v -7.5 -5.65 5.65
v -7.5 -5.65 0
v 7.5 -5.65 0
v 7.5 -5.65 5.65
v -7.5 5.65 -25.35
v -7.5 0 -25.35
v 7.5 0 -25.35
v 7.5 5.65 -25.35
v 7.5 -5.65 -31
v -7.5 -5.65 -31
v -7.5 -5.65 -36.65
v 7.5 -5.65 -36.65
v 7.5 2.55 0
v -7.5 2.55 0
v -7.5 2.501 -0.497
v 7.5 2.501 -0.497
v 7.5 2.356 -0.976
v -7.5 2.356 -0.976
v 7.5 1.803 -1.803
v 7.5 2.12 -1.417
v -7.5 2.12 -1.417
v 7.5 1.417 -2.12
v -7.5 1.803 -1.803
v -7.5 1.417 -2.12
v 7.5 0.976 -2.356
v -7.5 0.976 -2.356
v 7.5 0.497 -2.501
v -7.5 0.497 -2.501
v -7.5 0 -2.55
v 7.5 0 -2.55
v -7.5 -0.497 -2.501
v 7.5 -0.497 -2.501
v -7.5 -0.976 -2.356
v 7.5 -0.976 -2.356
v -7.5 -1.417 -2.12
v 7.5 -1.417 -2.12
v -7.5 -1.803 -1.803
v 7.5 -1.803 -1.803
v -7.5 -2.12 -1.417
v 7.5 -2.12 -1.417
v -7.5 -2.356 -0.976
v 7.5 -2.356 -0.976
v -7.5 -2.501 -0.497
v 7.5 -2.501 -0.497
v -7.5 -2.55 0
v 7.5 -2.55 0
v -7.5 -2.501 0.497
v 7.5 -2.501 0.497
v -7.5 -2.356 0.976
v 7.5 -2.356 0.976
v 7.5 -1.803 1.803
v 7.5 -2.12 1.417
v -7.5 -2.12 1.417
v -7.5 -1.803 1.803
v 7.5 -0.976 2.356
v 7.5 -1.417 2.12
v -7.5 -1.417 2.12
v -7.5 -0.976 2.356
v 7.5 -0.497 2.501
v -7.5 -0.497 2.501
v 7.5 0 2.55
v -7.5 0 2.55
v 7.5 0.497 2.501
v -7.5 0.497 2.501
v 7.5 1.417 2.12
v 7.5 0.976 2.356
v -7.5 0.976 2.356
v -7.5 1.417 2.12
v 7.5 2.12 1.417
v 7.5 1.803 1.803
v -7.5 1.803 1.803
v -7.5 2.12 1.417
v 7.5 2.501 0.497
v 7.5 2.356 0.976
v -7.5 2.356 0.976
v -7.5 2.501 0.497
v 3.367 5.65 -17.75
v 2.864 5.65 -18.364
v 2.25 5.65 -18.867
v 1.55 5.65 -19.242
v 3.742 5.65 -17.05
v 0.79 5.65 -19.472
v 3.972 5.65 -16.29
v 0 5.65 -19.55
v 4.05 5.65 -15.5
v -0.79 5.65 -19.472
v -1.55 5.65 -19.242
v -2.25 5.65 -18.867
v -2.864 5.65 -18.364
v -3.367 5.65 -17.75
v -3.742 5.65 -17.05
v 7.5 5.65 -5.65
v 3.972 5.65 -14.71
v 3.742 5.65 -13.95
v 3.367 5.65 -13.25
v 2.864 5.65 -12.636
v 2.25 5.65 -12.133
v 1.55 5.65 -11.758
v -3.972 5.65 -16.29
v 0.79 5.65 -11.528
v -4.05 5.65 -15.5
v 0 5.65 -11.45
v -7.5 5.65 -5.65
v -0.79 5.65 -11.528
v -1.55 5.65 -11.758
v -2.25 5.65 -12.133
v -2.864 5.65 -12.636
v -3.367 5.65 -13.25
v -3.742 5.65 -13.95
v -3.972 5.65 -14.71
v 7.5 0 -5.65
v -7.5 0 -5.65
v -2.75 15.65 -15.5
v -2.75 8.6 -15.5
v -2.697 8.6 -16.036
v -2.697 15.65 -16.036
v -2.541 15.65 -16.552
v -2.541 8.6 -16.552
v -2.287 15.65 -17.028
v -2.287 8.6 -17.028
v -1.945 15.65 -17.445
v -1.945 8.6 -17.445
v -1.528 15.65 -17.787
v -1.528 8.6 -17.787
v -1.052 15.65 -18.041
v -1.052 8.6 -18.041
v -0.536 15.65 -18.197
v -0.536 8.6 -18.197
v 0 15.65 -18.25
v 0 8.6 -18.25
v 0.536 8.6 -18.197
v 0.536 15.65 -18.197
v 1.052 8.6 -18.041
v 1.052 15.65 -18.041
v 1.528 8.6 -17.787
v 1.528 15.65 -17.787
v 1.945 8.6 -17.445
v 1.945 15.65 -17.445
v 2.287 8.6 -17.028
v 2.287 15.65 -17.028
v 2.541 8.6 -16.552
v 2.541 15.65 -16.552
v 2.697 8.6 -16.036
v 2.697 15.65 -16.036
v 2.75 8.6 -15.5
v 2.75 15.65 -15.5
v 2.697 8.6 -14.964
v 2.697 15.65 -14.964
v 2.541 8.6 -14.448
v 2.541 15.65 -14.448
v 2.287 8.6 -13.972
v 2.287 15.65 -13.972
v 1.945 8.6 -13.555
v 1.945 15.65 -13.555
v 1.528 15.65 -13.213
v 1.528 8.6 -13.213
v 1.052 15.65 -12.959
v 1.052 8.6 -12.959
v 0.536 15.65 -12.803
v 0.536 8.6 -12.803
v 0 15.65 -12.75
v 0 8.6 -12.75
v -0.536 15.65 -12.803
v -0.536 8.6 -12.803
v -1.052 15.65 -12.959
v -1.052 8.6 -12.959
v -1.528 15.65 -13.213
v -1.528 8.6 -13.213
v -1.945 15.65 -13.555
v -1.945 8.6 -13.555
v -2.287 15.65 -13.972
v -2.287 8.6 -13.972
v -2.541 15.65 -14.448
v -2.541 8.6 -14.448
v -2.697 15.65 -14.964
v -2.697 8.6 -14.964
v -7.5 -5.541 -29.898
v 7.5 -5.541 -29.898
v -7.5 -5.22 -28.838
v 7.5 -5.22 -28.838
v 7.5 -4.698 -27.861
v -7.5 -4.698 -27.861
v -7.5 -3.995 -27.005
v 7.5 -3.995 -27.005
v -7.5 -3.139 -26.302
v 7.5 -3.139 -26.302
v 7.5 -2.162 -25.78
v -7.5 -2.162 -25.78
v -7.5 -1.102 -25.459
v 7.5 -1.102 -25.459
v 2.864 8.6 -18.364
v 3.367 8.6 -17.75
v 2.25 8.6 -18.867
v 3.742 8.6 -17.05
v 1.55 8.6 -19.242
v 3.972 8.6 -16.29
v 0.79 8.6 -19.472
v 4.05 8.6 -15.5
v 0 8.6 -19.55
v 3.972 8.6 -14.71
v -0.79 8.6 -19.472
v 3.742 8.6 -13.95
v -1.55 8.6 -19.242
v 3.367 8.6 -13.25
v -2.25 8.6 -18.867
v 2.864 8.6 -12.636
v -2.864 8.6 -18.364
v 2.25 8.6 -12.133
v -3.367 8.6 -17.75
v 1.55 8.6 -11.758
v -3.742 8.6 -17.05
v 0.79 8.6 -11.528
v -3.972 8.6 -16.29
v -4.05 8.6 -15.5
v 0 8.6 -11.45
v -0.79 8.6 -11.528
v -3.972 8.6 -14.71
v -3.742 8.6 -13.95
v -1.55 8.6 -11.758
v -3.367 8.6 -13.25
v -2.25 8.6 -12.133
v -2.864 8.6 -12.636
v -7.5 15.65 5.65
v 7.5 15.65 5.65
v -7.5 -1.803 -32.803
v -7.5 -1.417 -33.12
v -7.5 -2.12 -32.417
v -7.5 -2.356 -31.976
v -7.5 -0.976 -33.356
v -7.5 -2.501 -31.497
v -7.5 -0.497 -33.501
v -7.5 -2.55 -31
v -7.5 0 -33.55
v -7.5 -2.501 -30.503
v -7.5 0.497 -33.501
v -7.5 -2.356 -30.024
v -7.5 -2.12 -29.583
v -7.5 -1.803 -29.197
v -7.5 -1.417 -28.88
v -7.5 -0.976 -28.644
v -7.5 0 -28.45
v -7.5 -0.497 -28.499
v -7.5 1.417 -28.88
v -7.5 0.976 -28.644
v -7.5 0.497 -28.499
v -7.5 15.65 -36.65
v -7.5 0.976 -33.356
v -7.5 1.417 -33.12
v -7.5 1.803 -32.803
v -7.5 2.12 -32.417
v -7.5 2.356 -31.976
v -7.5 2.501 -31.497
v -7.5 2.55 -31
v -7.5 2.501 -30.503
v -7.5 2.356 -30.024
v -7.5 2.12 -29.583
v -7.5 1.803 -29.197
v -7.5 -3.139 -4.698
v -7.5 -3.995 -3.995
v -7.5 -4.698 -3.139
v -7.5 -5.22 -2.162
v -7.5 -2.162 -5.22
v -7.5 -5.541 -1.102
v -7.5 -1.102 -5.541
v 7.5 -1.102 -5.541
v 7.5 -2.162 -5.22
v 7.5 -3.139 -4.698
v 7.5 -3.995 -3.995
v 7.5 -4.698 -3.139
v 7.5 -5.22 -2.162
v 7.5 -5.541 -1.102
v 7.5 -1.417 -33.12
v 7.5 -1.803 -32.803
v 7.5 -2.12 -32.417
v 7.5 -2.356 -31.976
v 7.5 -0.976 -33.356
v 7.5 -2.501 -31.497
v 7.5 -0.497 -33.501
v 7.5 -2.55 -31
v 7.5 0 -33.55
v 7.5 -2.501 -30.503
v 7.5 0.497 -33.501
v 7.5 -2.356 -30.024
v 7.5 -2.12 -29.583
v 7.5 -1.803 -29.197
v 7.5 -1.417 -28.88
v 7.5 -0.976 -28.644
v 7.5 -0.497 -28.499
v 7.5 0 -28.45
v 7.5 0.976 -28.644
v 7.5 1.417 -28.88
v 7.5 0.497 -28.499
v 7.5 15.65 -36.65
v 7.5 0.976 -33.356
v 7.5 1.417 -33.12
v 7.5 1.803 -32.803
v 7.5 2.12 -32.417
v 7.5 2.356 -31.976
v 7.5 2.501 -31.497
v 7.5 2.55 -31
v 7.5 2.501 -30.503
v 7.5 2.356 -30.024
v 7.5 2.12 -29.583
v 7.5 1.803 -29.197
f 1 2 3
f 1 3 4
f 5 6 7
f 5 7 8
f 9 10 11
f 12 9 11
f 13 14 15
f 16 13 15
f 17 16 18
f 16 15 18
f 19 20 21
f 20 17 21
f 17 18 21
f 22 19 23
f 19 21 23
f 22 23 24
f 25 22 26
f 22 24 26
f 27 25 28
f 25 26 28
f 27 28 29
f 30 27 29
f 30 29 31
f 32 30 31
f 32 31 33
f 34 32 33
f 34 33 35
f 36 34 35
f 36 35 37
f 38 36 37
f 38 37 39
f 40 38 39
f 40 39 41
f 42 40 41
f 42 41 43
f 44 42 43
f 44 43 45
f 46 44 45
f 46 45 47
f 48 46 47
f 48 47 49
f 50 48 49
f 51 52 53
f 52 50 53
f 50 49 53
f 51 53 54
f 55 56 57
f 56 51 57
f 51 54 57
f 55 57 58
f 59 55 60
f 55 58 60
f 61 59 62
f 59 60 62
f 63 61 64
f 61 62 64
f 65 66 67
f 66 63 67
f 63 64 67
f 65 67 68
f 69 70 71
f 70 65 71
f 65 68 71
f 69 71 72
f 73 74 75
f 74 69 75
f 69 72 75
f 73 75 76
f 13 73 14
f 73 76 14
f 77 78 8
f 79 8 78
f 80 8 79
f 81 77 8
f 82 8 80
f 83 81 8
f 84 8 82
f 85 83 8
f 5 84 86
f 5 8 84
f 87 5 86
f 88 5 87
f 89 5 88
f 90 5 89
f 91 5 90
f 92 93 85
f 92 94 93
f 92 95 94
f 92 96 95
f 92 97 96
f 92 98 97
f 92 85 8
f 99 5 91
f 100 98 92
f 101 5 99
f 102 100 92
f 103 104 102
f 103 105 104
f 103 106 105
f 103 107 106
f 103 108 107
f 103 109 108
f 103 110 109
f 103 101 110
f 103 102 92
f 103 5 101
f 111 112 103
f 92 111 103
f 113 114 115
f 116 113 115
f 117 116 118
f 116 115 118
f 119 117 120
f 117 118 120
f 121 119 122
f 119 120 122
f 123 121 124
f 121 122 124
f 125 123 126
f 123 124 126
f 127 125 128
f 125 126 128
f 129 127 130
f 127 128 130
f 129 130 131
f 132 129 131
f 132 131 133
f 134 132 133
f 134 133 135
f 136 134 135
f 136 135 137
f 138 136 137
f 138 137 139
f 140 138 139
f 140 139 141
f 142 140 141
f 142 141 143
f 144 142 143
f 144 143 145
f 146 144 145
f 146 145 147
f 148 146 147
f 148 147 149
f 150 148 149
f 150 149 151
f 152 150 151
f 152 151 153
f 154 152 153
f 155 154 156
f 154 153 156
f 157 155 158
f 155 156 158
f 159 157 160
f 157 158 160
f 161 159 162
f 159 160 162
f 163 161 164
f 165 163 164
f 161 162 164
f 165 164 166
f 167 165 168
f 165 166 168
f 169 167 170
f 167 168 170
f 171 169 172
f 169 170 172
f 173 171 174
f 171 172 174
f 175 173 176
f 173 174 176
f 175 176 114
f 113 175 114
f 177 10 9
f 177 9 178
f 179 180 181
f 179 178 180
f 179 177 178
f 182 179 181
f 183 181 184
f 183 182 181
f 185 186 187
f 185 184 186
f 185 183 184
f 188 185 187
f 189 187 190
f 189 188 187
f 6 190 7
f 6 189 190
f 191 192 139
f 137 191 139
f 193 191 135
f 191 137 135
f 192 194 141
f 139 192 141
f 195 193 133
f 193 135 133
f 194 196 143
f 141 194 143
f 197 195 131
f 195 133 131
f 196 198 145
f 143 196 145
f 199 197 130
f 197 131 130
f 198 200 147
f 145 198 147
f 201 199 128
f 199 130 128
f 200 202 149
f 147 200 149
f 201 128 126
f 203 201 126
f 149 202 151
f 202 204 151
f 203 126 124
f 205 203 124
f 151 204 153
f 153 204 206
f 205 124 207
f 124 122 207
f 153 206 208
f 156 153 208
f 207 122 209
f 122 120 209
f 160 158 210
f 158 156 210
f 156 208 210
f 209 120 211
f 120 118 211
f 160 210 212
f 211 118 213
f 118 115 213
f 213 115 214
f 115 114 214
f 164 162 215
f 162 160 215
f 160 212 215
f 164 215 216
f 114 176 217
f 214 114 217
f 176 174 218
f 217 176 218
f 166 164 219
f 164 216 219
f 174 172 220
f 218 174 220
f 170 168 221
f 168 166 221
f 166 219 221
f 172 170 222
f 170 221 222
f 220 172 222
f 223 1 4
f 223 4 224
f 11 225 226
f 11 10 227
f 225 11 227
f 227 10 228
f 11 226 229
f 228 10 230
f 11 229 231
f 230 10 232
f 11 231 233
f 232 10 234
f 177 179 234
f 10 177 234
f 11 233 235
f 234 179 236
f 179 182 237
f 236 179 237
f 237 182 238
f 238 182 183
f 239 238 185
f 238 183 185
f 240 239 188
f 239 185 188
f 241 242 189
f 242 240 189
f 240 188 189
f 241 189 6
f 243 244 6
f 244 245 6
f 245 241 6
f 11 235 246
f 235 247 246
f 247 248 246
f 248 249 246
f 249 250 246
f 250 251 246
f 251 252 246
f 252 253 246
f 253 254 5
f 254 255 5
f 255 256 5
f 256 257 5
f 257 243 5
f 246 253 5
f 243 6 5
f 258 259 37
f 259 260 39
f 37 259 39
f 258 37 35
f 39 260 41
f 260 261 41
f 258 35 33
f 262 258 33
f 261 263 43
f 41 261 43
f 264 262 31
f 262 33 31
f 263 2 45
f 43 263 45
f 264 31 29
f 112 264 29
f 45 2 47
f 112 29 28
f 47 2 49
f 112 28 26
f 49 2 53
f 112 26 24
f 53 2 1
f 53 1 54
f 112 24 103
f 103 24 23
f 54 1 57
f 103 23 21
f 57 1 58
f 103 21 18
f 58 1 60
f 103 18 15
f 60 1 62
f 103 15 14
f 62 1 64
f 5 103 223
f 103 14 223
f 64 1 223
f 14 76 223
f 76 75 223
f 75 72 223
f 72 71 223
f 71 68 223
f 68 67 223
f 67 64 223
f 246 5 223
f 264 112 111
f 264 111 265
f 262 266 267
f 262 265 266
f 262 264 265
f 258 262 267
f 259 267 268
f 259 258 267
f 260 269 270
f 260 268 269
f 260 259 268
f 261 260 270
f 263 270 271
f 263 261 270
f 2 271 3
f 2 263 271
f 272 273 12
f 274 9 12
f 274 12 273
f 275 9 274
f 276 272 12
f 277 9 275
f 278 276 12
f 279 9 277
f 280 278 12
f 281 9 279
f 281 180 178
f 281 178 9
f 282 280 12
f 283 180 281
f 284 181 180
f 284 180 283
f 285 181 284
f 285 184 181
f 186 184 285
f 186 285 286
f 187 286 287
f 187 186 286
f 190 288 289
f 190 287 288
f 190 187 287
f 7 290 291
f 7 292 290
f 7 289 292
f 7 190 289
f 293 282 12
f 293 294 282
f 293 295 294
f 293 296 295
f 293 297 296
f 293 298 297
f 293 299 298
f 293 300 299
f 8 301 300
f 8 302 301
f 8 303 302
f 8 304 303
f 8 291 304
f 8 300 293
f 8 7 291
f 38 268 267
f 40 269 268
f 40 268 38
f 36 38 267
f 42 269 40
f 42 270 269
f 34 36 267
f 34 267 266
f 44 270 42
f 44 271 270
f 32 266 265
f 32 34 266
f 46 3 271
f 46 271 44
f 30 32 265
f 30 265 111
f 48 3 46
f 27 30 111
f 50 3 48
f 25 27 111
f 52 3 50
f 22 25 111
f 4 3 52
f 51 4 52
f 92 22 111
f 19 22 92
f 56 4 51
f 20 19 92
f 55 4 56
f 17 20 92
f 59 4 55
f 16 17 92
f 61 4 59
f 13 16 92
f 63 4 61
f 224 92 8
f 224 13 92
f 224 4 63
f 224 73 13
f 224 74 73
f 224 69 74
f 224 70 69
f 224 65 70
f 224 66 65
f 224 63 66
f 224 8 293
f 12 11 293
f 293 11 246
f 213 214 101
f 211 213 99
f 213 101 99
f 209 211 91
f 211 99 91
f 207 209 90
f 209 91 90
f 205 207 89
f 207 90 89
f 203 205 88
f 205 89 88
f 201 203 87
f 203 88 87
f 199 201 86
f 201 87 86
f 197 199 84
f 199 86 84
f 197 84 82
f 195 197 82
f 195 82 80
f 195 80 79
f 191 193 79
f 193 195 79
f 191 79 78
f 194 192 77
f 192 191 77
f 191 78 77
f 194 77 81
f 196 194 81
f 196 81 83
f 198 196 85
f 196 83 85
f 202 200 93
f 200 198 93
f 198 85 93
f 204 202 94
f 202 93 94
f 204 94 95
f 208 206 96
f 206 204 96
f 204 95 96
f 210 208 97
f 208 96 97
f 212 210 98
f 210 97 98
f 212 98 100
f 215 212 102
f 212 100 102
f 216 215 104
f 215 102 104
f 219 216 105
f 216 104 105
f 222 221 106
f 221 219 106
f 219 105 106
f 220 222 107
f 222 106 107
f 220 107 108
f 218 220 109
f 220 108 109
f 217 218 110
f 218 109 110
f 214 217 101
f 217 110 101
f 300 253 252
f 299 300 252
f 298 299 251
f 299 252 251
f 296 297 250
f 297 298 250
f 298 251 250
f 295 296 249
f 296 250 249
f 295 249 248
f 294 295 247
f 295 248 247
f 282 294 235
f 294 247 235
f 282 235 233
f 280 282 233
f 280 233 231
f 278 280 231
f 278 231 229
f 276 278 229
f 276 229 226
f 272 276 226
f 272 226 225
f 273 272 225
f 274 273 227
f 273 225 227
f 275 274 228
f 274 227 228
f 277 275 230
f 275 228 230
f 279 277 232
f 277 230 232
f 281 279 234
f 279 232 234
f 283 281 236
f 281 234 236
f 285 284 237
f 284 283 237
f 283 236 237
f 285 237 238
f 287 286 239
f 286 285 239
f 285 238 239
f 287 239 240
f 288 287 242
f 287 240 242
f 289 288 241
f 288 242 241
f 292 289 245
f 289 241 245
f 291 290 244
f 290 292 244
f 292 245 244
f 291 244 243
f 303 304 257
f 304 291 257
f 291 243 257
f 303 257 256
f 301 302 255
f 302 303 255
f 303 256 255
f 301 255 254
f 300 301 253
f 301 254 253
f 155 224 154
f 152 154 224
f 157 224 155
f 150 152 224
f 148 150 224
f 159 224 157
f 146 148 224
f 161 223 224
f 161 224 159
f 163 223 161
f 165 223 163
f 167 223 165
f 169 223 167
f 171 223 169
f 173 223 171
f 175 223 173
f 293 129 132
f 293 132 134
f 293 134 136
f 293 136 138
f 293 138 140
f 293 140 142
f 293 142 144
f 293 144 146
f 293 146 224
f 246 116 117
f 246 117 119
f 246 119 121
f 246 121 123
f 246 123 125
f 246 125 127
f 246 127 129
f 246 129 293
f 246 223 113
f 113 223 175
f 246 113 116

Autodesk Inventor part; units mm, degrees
ref_plane "YZ Plane" through (0, 0, 0) normal (1, 0, 0) x (0, 1, 0)
ref_plane "XY Plane" through (0, 0, 0) normal (0, 0, 1) x (1, 0, 0)
sketch "Sketch3" plane through (0, 0, 0) normal (1, 0, 0) x (0, 1, 0)
  circle A0 centre (0, 0) radius 5.65 construction
  line L0 (-5.65, 0) -> (-5.65, 5.65)
  line L1 (0, -5.65) -> (5.65, -5.65)
  arc A1 (-5.65, 0) -> (0, -5.65) centre (0, 0) ccw
  line L2 (-5.65, 5.65) -> (5.65, 5.65)
  line L3 (5.65, -15.5) -> (-5.65, -15.5) construction
  line L4 (5.65, 5.65) -> (15.65, 5.65)
  line L5 (15.65, 5.65) -> (15.65, -15.5)
  line L6 (5.65, -5.65) -> (5.65, -15.5)
  line L7 (15.65, -15.5) -> (5.65, -15.5) construction
  circle A2 centre (0, 0) radius 2.55
  line L8 (-5.65, -31) -> (-5.65, -36.65)
  arc A3 (0, -25.35) -> (-5.65, -31) centre (0, -31) ccw
  line L9 (0, -25.35) -> (5.65, -25.35)
  line L10 (-5.65, -36.65) -> (5.65, -36.65)
  line L11 (5.65, -36.65) -> (15.65, -36.65)
  line L12 (15.65, -36.65) -> (15.65, -15.5)
  line L13 (5.65, -25.35) -> (5.65, -15.5)
  circle A4 centre (0, -31) radius 2.55
  dimension "d19" = 11.3
  dimension "d20" = 5.65
  dimension "d23" = 10
  dimension "d24" = 10
  dimension "d25" = 11.3
  dimension "d26" = 5.1
  dimension "d36" = 21.15
ref_plane "Work Plane1" through (0, 5.5, 0) normal (0, 1, 0) x (-1, 0, 0)
extrude "Extrusion5" add sketch "Sketch3" along normal mid plane 15
sketch "Sketch5" plane through (0, 5.5, 0) normal (0, 1, 0) x (-1, 0, 0)
  line L0 (7.5, -25.35) -> (-7.5, -25.35) construction
  line L1 (-7.5, -5.65) -> (-7.5, -25.35) construction
  line L2 (-7.5, -5.65) -> (7.5, -5.65) construction
  line L3 (7.5, -25.35) -> (7.5, -5.65) construction
  line L4 (-7.5, -5.65) -> (-7.5, -25.35) construction
  line L5 (-7.5, -15.5) -> (7.5, -15.5) construction
  line L6 (-7.5, -5.65) -> (7.5, -5.65) construction
  line L7 (0, -5.65) -> (0, -25.35) construction
  circle A0 centre (0, -15.5) radius 4.05
  circle A1 centre (0, -15.5) radius 2.75
  point P0 (0, 0)
  dimension "d40" = 8.1
  dimension "d41" = 5.5
extrude "Extrusion6" cut sketch "Sketch5" along normal through all both and the other way through all contours A1
extrude "Extrusion7" cut sketch "Sketch5" along normal blind 3.1
properties part number "sostenedor_part2"
